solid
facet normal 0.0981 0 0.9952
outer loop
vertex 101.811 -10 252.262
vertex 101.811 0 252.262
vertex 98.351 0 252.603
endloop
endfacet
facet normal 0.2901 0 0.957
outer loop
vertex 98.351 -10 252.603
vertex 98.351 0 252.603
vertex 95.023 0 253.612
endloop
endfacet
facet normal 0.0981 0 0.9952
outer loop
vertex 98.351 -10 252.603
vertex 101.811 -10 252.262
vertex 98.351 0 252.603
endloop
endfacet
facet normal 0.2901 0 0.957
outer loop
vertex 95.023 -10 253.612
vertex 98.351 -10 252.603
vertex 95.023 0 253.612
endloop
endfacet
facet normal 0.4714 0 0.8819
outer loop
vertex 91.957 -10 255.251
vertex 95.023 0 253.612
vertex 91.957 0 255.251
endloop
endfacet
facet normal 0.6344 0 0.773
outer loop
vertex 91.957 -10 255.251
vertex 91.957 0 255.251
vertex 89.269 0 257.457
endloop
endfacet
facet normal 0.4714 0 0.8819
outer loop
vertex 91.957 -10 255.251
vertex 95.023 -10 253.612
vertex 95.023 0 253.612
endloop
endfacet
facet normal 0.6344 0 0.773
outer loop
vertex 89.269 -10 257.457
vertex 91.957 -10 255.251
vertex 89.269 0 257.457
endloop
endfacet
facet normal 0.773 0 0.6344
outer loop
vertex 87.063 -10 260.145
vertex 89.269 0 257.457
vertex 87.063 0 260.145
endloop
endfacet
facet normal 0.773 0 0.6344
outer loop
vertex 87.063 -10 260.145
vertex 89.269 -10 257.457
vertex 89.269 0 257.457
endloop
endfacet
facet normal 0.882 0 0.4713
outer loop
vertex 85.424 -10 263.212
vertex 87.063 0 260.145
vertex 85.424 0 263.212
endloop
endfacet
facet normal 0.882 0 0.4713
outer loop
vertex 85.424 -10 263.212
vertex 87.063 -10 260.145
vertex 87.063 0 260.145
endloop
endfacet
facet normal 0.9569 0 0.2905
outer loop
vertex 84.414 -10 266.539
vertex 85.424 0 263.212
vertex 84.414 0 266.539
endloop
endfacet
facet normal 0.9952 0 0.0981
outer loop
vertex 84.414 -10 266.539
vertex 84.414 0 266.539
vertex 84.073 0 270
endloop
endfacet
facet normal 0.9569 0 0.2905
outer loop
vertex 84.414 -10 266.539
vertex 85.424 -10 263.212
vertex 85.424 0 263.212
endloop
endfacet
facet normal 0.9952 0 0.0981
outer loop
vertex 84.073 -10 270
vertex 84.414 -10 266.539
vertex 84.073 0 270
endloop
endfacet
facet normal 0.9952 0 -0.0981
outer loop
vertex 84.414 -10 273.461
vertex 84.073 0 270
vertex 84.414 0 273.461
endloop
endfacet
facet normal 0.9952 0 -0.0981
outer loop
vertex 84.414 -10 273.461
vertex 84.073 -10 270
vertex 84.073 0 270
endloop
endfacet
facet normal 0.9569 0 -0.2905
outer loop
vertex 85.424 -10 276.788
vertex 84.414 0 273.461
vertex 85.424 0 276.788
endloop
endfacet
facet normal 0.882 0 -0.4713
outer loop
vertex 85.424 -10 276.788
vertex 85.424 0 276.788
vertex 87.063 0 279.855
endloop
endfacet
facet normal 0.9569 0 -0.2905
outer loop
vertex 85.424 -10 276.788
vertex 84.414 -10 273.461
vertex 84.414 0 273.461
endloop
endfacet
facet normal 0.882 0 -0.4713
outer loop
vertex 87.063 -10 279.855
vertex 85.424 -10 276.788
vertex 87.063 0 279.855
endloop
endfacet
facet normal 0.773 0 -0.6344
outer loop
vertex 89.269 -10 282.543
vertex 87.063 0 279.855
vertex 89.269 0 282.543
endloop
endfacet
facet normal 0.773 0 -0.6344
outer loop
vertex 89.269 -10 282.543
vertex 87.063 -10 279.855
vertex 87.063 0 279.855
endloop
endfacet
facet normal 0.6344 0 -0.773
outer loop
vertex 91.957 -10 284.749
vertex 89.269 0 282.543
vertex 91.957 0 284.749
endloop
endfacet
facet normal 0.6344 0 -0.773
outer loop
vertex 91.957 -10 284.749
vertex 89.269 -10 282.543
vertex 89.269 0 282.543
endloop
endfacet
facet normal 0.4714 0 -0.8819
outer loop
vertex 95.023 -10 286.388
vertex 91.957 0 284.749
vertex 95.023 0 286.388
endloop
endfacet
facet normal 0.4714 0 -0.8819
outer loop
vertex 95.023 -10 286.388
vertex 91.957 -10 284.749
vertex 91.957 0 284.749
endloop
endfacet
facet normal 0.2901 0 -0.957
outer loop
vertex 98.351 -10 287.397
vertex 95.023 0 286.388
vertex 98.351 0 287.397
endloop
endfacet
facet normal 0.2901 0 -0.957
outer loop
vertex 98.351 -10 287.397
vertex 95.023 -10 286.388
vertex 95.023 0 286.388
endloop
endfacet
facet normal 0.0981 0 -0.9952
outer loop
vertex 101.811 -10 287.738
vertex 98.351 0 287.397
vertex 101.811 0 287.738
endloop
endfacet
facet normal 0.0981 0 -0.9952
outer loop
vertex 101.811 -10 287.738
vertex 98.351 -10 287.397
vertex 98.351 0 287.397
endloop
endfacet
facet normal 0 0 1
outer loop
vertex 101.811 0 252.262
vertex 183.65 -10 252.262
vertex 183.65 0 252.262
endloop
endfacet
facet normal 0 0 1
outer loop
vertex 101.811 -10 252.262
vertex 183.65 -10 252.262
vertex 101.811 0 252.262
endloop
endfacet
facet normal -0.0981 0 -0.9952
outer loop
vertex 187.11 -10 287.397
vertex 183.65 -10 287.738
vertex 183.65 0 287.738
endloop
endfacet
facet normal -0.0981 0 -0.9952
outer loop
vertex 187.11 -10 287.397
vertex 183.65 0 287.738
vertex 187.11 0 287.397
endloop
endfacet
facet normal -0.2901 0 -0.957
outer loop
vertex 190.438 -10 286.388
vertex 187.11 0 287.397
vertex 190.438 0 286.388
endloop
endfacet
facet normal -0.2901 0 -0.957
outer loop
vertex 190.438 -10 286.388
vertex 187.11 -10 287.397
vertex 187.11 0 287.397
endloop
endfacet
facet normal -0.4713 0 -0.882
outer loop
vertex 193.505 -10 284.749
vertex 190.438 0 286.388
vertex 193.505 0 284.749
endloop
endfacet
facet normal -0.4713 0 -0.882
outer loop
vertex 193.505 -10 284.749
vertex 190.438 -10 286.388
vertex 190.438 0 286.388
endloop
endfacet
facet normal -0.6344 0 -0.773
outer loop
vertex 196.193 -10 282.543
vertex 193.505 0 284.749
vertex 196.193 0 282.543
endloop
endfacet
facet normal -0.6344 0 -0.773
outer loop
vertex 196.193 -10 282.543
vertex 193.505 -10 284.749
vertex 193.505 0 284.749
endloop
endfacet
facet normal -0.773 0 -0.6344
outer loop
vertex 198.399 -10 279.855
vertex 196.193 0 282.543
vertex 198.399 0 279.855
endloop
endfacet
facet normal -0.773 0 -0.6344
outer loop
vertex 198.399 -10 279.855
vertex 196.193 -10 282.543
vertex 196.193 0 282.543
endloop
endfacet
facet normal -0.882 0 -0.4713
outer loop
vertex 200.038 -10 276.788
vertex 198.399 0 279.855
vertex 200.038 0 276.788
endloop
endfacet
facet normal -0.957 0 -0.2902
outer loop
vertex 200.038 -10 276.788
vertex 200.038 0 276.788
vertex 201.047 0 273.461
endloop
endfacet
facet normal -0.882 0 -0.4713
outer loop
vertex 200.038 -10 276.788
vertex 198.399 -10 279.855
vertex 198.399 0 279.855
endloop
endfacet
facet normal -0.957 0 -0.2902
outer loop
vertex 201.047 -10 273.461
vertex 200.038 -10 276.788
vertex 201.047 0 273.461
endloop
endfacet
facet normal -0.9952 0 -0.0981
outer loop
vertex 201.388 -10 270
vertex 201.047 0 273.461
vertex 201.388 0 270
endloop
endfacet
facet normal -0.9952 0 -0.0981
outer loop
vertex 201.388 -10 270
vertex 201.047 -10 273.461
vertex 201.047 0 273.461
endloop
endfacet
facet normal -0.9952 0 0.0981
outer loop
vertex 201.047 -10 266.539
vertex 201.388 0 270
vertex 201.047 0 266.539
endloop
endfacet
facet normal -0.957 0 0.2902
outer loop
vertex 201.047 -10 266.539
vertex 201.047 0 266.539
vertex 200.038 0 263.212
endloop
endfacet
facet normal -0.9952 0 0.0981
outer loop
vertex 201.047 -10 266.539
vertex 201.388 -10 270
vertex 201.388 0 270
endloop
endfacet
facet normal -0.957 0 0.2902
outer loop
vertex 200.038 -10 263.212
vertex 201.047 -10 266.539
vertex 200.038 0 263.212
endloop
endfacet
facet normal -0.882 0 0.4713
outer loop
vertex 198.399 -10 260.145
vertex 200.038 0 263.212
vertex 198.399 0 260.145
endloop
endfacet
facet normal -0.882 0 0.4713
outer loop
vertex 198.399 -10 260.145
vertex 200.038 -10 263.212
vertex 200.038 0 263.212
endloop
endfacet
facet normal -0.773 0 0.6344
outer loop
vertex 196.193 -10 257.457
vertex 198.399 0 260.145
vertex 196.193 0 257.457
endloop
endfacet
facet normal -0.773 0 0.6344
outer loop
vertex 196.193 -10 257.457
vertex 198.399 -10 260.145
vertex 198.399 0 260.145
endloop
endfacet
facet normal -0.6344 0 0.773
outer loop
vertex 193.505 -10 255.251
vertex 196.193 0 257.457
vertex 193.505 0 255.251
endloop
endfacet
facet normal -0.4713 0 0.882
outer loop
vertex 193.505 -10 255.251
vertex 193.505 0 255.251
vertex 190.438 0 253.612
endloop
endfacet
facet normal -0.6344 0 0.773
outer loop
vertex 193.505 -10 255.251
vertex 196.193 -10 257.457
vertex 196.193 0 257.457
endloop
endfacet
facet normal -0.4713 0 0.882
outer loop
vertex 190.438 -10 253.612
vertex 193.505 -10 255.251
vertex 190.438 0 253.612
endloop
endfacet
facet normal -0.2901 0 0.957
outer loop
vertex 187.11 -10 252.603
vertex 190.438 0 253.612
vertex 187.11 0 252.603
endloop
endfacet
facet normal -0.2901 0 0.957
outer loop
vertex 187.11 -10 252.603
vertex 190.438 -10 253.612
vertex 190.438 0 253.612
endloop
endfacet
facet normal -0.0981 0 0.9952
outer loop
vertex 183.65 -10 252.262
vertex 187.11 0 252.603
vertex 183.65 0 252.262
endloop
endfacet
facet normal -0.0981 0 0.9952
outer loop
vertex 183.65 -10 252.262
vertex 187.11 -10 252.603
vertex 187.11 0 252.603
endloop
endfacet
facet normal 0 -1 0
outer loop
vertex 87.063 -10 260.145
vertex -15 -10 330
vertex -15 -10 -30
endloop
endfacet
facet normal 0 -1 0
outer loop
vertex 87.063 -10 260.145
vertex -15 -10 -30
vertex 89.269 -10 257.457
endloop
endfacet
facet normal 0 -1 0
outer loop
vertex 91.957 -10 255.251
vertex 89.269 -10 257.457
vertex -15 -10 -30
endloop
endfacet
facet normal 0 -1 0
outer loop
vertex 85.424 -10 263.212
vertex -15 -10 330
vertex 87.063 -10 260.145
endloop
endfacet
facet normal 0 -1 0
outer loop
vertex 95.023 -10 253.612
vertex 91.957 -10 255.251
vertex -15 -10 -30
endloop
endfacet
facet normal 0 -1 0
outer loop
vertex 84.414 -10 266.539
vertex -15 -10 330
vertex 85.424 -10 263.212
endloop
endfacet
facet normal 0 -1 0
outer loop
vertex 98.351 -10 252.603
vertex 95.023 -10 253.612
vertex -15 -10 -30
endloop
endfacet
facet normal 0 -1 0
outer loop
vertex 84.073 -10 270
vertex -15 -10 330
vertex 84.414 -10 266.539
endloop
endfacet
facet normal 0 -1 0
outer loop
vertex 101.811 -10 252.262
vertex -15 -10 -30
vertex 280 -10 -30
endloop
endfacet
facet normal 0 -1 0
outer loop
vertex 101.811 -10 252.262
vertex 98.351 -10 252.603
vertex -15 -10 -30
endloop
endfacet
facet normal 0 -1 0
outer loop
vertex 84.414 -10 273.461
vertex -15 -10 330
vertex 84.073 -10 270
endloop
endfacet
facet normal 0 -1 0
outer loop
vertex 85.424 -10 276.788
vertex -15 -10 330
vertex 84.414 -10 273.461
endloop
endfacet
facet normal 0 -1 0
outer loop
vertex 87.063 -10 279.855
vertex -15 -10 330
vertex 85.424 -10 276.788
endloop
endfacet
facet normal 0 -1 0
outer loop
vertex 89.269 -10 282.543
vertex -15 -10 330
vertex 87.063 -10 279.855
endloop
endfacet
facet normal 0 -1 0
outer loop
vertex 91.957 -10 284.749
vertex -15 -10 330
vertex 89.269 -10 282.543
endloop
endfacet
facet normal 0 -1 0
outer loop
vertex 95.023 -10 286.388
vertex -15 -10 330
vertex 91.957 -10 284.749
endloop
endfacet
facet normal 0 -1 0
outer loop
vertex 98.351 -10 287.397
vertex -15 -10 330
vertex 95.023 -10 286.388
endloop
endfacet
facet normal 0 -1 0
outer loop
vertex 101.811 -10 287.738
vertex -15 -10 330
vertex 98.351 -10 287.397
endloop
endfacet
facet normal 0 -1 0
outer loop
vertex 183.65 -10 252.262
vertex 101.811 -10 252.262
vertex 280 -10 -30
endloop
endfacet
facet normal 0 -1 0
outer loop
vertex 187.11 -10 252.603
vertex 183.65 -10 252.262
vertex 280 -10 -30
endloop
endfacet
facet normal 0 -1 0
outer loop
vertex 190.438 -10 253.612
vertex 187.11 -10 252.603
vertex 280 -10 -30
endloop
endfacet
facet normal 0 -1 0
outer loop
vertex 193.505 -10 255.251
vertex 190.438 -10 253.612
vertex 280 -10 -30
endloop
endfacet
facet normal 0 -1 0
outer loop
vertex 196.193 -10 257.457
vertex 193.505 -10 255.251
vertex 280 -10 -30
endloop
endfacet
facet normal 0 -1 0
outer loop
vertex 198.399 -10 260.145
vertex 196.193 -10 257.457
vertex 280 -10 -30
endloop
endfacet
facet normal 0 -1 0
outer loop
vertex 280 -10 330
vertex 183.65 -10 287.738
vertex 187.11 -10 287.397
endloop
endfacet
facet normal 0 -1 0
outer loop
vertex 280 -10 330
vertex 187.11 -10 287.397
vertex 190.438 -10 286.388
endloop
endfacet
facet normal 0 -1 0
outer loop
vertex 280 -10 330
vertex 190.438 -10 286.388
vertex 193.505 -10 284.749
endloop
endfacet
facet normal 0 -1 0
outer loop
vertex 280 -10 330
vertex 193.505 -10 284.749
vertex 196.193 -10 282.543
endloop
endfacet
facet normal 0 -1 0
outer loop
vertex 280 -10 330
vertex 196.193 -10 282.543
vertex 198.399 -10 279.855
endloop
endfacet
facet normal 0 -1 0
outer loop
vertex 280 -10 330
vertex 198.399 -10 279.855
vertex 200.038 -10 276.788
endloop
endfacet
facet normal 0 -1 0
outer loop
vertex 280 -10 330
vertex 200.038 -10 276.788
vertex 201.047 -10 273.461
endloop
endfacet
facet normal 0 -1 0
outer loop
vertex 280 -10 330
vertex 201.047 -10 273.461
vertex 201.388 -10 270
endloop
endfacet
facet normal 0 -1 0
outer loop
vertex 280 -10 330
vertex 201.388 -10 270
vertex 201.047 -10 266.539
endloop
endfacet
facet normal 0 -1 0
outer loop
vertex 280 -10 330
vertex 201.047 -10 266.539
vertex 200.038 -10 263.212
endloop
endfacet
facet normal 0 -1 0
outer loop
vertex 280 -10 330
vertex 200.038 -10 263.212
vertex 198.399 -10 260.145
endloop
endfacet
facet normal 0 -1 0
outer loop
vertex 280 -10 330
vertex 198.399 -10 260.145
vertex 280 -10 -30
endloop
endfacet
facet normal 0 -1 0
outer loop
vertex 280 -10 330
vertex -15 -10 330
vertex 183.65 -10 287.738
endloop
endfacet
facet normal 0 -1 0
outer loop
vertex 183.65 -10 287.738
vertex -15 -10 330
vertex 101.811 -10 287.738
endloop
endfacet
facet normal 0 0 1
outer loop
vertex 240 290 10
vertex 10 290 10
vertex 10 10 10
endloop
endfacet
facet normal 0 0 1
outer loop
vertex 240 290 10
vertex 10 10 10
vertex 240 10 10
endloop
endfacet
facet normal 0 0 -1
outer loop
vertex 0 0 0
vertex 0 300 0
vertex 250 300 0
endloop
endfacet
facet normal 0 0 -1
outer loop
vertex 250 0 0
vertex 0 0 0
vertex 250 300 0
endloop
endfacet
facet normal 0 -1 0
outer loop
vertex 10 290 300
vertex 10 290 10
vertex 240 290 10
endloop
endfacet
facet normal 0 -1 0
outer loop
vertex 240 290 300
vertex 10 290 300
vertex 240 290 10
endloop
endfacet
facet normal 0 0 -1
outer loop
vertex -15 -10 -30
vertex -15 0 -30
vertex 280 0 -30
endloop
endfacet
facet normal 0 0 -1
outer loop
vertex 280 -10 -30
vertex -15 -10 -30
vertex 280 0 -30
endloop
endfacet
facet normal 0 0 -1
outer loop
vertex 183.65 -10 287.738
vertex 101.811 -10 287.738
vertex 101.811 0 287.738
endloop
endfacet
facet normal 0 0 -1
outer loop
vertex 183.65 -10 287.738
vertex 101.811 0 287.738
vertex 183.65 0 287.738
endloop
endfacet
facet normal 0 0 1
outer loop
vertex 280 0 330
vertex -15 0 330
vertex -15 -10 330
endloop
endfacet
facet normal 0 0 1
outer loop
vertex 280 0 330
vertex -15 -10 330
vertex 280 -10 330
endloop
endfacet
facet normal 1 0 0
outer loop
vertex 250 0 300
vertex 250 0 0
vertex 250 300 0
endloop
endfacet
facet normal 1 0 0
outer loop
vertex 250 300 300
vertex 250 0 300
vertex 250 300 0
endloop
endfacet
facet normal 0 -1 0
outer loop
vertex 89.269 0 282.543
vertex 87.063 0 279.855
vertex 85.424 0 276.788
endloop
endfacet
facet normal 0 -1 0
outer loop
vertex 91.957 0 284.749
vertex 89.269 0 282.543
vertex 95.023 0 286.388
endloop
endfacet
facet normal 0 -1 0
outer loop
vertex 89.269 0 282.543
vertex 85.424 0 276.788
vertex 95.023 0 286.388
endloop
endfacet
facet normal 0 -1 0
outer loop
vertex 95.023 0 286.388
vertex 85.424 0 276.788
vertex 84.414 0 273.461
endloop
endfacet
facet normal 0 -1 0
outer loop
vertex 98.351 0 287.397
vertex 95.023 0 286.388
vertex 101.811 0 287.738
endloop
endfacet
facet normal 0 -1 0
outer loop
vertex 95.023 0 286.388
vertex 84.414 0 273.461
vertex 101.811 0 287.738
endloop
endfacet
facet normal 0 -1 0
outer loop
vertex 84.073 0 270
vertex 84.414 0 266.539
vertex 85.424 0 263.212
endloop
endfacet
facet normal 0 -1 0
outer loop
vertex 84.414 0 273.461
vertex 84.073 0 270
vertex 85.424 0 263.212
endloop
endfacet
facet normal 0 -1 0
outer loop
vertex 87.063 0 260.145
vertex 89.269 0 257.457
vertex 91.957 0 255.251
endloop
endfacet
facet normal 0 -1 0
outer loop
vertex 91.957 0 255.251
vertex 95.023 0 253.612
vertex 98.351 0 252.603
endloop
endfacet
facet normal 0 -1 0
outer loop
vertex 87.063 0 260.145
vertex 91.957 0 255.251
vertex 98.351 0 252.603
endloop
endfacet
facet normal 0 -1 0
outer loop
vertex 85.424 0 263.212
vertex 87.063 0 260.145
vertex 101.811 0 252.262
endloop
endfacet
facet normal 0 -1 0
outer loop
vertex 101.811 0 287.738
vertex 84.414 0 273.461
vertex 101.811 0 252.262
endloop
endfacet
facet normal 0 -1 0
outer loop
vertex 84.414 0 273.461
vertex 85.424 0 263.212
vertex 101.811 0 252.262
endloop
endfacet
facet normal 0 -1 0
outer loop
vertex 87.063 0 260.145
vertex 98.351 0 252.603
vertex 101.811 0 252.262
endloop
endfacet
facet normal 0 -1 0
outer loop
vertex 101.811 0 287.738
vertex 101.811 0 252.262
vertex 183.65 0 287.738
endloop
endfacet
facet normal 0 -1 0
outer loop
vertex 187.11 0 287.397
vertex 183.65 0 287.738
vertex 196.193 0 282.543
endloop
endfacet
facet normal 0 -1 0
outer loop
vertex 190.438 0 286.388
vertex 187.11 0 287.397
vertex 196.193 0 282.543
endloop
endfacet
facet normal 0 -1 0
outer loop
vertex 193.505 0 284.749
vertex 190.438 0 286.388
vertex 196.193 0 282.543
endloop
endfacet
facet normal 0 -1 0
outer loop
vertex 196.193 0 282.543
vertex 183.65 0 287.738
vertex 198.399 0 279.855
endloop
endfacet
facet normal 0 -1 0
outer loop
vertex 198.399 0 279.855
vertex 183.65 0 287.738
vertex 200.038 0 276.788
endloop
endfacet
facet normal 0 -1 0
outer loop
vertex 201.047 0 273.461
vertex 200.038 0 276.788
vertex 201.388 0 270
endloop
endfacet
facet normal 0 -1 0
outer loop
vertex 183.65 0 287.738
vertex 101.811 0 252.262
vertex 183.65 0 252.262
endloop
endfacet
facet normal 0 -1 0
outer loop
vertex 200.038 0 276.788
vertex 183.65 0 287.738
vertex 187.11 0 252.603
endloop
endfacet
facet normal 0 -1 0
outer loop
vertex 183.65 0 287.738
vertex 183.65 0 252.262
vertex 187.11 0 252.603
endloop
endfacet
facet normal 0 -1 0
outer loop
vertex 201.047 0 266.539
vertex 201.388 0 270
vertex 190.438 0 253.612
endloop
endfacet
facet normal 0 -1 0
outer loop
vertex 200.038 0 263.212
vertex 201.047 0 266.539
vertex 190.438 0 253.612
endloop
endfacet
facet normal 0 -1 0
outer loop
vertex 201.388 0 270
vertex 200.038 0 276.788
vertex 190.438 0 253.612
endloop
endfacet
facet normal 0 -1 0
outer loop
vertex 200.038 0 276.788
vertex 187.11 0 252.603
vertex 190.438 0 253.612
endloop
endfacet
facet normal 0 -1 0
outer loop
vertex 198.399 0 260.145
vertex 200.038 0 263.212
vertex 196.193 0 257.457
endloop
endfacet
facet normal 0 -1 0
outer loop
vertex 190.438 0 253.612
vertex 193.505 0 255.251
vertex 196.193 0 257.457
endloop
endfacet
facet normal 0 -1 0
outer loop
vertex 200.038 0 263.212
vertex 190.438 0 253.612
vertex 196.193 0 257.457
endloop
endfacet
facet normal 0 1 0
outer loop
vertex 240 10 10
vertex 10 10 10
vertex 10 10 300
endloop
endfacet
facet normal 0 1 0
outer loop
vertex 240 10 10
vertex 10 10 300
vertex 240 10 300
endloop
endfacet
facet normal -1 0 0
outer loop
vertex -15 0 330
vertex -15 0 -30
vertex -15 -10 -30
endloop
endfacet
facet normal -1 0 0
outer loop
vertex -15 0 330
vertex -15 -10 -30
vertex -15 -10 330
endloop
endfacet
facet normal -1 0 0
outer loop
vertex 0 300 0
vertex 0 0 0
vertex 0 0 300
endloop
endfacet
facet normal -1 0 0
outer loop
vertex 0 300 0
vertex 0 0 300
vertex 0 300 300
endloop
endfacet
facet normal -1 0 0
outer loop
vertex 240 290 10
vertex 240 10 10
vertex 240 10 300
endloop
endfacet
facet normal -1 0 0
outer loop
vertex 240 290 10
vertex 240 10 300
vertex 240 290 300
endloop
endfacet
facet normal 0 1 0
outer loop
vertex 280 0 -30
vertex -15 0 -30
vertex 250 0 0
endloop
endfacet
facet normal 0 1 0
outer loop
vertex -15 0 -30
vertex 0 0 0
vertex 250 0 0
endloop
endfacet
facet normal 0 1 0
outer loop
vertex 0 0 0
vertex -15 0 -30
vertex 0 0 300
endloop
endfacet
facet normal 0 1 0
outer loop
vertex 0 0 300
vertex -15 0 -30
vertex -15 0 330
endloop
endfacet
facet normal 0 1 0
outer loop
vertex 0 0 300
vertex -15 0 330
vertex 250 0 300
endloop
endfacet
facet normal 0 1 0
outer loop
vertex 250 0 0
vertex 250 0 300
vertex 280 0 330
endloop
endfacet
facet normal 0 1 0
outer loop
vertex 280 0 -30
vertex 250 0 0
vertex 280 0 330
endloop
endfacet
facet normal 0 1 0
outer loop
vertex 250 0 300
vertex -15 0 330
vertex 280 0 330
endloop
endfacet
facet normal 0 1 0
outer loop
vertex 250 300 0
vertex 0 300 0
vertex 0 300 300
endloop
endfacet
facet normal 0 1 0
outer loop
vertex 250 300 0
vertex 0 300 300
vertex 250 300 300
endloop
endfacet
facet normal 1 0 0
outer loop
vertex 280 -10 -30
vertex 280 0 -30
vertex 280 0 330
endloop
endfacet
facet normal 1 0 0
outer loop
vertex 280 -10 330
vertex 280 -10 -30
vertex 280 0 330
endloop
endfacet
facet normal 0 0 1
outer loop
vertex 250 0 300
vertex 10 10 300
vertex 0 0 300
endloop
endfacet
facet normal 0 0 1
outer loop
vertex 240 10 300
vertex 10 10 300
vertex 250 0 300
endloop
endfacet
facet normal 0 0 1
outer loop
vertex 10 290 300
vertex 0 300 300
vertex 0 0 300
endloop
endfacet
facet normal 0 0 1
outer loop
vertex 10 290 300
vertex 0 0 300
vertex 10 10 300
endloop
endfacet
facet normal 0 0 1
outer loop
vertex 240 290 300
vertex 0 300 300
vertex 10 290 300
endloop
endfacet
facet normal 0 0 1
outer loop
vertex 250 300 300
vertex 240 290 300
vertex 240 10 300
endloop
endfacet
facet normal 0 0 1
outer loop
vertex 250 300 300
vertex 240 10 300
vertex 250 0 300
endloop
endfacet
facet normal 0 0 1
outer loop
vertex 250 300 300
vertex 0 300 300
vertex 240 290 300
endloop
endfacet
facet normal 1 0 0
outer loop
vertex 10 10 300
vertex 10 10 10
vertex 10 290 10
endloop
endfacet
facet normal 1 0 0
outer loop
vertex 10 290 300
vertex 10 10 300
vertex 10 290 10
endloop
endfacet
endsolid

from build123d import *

# Parameters (mm, degrees)
SKETCH_1_W          = 250
SKETCH_1_H          = 300
EXTRUDE_1_DEPTH     = 300
SKETCH_2_W          = 230
SKETCH_2_H          = 280
CUT_EXTRUDE_1_DEPTH = 290
SKETCH_3_W          = 295
SKETCH_3_H          = 360
EXTRUDE_2_DEPTH     = 10
CUT_EXTRUDE_2_DEPTH = 10


with BuildPart() as part:
    # 草图1 → 凸台-拉伸1 (new body)
    with BuildSketch(Plane.XY):
        with Locations((125, 150)):
            Rectangle(SKETCH_1_W, SKETCH_1_H)
    extrude(amount=EXTRUDE_1_DEPTH)

    # 草图2 → 切除-拉伸1 (cut)
    with BuildSketch(Plane.XY.offset(300)):
        with Locations((125, 150)):
            Rectangle(SKETCH_2_W, SKETCH_2_H)
    extrude(amount=-CUT_EXTRUDE_1_DEPTH, mode=Mode.SUBTRACT)

    # 草图3 → 凸台-拉伸2 (add)
    with BuildSketch(Plane.XZ):
        with Locations((132.5, 150)):
            Rectangle(SKETCH_3_W, SKETCH_3_H)
    extrude(amount=EXTRUDE_2_DEPTH)

    # 草图4 → 切除-拉伸2 (cut)
    with BuildSketch(Plane(origin=(0, -10, 0), x_dir=(-1, 0, 0), z_dir=(0, -1, 0))):
        with BuildLine():
            Line((-101.811483313, -287.738071641), (-183.649909723, -287.738071641))
            ThreePointArc((-183.649909723, -287.738071641), (-201.387981364, -270), (-183.649909723, -252.261928359))
            Line((-183.649909723, -252.261928359), (-101.811483313, -252.261928359))
            ThreePointArc((-101.811483313, -252.261928359), (-84.073411671, -270), (-101.811483313, -287.738071641))
        make_face()
    extrude(amount=-CUT_EXTRUDE_2_DEPTH, mode=Mode.SUBTRACT)


solid = part.part
